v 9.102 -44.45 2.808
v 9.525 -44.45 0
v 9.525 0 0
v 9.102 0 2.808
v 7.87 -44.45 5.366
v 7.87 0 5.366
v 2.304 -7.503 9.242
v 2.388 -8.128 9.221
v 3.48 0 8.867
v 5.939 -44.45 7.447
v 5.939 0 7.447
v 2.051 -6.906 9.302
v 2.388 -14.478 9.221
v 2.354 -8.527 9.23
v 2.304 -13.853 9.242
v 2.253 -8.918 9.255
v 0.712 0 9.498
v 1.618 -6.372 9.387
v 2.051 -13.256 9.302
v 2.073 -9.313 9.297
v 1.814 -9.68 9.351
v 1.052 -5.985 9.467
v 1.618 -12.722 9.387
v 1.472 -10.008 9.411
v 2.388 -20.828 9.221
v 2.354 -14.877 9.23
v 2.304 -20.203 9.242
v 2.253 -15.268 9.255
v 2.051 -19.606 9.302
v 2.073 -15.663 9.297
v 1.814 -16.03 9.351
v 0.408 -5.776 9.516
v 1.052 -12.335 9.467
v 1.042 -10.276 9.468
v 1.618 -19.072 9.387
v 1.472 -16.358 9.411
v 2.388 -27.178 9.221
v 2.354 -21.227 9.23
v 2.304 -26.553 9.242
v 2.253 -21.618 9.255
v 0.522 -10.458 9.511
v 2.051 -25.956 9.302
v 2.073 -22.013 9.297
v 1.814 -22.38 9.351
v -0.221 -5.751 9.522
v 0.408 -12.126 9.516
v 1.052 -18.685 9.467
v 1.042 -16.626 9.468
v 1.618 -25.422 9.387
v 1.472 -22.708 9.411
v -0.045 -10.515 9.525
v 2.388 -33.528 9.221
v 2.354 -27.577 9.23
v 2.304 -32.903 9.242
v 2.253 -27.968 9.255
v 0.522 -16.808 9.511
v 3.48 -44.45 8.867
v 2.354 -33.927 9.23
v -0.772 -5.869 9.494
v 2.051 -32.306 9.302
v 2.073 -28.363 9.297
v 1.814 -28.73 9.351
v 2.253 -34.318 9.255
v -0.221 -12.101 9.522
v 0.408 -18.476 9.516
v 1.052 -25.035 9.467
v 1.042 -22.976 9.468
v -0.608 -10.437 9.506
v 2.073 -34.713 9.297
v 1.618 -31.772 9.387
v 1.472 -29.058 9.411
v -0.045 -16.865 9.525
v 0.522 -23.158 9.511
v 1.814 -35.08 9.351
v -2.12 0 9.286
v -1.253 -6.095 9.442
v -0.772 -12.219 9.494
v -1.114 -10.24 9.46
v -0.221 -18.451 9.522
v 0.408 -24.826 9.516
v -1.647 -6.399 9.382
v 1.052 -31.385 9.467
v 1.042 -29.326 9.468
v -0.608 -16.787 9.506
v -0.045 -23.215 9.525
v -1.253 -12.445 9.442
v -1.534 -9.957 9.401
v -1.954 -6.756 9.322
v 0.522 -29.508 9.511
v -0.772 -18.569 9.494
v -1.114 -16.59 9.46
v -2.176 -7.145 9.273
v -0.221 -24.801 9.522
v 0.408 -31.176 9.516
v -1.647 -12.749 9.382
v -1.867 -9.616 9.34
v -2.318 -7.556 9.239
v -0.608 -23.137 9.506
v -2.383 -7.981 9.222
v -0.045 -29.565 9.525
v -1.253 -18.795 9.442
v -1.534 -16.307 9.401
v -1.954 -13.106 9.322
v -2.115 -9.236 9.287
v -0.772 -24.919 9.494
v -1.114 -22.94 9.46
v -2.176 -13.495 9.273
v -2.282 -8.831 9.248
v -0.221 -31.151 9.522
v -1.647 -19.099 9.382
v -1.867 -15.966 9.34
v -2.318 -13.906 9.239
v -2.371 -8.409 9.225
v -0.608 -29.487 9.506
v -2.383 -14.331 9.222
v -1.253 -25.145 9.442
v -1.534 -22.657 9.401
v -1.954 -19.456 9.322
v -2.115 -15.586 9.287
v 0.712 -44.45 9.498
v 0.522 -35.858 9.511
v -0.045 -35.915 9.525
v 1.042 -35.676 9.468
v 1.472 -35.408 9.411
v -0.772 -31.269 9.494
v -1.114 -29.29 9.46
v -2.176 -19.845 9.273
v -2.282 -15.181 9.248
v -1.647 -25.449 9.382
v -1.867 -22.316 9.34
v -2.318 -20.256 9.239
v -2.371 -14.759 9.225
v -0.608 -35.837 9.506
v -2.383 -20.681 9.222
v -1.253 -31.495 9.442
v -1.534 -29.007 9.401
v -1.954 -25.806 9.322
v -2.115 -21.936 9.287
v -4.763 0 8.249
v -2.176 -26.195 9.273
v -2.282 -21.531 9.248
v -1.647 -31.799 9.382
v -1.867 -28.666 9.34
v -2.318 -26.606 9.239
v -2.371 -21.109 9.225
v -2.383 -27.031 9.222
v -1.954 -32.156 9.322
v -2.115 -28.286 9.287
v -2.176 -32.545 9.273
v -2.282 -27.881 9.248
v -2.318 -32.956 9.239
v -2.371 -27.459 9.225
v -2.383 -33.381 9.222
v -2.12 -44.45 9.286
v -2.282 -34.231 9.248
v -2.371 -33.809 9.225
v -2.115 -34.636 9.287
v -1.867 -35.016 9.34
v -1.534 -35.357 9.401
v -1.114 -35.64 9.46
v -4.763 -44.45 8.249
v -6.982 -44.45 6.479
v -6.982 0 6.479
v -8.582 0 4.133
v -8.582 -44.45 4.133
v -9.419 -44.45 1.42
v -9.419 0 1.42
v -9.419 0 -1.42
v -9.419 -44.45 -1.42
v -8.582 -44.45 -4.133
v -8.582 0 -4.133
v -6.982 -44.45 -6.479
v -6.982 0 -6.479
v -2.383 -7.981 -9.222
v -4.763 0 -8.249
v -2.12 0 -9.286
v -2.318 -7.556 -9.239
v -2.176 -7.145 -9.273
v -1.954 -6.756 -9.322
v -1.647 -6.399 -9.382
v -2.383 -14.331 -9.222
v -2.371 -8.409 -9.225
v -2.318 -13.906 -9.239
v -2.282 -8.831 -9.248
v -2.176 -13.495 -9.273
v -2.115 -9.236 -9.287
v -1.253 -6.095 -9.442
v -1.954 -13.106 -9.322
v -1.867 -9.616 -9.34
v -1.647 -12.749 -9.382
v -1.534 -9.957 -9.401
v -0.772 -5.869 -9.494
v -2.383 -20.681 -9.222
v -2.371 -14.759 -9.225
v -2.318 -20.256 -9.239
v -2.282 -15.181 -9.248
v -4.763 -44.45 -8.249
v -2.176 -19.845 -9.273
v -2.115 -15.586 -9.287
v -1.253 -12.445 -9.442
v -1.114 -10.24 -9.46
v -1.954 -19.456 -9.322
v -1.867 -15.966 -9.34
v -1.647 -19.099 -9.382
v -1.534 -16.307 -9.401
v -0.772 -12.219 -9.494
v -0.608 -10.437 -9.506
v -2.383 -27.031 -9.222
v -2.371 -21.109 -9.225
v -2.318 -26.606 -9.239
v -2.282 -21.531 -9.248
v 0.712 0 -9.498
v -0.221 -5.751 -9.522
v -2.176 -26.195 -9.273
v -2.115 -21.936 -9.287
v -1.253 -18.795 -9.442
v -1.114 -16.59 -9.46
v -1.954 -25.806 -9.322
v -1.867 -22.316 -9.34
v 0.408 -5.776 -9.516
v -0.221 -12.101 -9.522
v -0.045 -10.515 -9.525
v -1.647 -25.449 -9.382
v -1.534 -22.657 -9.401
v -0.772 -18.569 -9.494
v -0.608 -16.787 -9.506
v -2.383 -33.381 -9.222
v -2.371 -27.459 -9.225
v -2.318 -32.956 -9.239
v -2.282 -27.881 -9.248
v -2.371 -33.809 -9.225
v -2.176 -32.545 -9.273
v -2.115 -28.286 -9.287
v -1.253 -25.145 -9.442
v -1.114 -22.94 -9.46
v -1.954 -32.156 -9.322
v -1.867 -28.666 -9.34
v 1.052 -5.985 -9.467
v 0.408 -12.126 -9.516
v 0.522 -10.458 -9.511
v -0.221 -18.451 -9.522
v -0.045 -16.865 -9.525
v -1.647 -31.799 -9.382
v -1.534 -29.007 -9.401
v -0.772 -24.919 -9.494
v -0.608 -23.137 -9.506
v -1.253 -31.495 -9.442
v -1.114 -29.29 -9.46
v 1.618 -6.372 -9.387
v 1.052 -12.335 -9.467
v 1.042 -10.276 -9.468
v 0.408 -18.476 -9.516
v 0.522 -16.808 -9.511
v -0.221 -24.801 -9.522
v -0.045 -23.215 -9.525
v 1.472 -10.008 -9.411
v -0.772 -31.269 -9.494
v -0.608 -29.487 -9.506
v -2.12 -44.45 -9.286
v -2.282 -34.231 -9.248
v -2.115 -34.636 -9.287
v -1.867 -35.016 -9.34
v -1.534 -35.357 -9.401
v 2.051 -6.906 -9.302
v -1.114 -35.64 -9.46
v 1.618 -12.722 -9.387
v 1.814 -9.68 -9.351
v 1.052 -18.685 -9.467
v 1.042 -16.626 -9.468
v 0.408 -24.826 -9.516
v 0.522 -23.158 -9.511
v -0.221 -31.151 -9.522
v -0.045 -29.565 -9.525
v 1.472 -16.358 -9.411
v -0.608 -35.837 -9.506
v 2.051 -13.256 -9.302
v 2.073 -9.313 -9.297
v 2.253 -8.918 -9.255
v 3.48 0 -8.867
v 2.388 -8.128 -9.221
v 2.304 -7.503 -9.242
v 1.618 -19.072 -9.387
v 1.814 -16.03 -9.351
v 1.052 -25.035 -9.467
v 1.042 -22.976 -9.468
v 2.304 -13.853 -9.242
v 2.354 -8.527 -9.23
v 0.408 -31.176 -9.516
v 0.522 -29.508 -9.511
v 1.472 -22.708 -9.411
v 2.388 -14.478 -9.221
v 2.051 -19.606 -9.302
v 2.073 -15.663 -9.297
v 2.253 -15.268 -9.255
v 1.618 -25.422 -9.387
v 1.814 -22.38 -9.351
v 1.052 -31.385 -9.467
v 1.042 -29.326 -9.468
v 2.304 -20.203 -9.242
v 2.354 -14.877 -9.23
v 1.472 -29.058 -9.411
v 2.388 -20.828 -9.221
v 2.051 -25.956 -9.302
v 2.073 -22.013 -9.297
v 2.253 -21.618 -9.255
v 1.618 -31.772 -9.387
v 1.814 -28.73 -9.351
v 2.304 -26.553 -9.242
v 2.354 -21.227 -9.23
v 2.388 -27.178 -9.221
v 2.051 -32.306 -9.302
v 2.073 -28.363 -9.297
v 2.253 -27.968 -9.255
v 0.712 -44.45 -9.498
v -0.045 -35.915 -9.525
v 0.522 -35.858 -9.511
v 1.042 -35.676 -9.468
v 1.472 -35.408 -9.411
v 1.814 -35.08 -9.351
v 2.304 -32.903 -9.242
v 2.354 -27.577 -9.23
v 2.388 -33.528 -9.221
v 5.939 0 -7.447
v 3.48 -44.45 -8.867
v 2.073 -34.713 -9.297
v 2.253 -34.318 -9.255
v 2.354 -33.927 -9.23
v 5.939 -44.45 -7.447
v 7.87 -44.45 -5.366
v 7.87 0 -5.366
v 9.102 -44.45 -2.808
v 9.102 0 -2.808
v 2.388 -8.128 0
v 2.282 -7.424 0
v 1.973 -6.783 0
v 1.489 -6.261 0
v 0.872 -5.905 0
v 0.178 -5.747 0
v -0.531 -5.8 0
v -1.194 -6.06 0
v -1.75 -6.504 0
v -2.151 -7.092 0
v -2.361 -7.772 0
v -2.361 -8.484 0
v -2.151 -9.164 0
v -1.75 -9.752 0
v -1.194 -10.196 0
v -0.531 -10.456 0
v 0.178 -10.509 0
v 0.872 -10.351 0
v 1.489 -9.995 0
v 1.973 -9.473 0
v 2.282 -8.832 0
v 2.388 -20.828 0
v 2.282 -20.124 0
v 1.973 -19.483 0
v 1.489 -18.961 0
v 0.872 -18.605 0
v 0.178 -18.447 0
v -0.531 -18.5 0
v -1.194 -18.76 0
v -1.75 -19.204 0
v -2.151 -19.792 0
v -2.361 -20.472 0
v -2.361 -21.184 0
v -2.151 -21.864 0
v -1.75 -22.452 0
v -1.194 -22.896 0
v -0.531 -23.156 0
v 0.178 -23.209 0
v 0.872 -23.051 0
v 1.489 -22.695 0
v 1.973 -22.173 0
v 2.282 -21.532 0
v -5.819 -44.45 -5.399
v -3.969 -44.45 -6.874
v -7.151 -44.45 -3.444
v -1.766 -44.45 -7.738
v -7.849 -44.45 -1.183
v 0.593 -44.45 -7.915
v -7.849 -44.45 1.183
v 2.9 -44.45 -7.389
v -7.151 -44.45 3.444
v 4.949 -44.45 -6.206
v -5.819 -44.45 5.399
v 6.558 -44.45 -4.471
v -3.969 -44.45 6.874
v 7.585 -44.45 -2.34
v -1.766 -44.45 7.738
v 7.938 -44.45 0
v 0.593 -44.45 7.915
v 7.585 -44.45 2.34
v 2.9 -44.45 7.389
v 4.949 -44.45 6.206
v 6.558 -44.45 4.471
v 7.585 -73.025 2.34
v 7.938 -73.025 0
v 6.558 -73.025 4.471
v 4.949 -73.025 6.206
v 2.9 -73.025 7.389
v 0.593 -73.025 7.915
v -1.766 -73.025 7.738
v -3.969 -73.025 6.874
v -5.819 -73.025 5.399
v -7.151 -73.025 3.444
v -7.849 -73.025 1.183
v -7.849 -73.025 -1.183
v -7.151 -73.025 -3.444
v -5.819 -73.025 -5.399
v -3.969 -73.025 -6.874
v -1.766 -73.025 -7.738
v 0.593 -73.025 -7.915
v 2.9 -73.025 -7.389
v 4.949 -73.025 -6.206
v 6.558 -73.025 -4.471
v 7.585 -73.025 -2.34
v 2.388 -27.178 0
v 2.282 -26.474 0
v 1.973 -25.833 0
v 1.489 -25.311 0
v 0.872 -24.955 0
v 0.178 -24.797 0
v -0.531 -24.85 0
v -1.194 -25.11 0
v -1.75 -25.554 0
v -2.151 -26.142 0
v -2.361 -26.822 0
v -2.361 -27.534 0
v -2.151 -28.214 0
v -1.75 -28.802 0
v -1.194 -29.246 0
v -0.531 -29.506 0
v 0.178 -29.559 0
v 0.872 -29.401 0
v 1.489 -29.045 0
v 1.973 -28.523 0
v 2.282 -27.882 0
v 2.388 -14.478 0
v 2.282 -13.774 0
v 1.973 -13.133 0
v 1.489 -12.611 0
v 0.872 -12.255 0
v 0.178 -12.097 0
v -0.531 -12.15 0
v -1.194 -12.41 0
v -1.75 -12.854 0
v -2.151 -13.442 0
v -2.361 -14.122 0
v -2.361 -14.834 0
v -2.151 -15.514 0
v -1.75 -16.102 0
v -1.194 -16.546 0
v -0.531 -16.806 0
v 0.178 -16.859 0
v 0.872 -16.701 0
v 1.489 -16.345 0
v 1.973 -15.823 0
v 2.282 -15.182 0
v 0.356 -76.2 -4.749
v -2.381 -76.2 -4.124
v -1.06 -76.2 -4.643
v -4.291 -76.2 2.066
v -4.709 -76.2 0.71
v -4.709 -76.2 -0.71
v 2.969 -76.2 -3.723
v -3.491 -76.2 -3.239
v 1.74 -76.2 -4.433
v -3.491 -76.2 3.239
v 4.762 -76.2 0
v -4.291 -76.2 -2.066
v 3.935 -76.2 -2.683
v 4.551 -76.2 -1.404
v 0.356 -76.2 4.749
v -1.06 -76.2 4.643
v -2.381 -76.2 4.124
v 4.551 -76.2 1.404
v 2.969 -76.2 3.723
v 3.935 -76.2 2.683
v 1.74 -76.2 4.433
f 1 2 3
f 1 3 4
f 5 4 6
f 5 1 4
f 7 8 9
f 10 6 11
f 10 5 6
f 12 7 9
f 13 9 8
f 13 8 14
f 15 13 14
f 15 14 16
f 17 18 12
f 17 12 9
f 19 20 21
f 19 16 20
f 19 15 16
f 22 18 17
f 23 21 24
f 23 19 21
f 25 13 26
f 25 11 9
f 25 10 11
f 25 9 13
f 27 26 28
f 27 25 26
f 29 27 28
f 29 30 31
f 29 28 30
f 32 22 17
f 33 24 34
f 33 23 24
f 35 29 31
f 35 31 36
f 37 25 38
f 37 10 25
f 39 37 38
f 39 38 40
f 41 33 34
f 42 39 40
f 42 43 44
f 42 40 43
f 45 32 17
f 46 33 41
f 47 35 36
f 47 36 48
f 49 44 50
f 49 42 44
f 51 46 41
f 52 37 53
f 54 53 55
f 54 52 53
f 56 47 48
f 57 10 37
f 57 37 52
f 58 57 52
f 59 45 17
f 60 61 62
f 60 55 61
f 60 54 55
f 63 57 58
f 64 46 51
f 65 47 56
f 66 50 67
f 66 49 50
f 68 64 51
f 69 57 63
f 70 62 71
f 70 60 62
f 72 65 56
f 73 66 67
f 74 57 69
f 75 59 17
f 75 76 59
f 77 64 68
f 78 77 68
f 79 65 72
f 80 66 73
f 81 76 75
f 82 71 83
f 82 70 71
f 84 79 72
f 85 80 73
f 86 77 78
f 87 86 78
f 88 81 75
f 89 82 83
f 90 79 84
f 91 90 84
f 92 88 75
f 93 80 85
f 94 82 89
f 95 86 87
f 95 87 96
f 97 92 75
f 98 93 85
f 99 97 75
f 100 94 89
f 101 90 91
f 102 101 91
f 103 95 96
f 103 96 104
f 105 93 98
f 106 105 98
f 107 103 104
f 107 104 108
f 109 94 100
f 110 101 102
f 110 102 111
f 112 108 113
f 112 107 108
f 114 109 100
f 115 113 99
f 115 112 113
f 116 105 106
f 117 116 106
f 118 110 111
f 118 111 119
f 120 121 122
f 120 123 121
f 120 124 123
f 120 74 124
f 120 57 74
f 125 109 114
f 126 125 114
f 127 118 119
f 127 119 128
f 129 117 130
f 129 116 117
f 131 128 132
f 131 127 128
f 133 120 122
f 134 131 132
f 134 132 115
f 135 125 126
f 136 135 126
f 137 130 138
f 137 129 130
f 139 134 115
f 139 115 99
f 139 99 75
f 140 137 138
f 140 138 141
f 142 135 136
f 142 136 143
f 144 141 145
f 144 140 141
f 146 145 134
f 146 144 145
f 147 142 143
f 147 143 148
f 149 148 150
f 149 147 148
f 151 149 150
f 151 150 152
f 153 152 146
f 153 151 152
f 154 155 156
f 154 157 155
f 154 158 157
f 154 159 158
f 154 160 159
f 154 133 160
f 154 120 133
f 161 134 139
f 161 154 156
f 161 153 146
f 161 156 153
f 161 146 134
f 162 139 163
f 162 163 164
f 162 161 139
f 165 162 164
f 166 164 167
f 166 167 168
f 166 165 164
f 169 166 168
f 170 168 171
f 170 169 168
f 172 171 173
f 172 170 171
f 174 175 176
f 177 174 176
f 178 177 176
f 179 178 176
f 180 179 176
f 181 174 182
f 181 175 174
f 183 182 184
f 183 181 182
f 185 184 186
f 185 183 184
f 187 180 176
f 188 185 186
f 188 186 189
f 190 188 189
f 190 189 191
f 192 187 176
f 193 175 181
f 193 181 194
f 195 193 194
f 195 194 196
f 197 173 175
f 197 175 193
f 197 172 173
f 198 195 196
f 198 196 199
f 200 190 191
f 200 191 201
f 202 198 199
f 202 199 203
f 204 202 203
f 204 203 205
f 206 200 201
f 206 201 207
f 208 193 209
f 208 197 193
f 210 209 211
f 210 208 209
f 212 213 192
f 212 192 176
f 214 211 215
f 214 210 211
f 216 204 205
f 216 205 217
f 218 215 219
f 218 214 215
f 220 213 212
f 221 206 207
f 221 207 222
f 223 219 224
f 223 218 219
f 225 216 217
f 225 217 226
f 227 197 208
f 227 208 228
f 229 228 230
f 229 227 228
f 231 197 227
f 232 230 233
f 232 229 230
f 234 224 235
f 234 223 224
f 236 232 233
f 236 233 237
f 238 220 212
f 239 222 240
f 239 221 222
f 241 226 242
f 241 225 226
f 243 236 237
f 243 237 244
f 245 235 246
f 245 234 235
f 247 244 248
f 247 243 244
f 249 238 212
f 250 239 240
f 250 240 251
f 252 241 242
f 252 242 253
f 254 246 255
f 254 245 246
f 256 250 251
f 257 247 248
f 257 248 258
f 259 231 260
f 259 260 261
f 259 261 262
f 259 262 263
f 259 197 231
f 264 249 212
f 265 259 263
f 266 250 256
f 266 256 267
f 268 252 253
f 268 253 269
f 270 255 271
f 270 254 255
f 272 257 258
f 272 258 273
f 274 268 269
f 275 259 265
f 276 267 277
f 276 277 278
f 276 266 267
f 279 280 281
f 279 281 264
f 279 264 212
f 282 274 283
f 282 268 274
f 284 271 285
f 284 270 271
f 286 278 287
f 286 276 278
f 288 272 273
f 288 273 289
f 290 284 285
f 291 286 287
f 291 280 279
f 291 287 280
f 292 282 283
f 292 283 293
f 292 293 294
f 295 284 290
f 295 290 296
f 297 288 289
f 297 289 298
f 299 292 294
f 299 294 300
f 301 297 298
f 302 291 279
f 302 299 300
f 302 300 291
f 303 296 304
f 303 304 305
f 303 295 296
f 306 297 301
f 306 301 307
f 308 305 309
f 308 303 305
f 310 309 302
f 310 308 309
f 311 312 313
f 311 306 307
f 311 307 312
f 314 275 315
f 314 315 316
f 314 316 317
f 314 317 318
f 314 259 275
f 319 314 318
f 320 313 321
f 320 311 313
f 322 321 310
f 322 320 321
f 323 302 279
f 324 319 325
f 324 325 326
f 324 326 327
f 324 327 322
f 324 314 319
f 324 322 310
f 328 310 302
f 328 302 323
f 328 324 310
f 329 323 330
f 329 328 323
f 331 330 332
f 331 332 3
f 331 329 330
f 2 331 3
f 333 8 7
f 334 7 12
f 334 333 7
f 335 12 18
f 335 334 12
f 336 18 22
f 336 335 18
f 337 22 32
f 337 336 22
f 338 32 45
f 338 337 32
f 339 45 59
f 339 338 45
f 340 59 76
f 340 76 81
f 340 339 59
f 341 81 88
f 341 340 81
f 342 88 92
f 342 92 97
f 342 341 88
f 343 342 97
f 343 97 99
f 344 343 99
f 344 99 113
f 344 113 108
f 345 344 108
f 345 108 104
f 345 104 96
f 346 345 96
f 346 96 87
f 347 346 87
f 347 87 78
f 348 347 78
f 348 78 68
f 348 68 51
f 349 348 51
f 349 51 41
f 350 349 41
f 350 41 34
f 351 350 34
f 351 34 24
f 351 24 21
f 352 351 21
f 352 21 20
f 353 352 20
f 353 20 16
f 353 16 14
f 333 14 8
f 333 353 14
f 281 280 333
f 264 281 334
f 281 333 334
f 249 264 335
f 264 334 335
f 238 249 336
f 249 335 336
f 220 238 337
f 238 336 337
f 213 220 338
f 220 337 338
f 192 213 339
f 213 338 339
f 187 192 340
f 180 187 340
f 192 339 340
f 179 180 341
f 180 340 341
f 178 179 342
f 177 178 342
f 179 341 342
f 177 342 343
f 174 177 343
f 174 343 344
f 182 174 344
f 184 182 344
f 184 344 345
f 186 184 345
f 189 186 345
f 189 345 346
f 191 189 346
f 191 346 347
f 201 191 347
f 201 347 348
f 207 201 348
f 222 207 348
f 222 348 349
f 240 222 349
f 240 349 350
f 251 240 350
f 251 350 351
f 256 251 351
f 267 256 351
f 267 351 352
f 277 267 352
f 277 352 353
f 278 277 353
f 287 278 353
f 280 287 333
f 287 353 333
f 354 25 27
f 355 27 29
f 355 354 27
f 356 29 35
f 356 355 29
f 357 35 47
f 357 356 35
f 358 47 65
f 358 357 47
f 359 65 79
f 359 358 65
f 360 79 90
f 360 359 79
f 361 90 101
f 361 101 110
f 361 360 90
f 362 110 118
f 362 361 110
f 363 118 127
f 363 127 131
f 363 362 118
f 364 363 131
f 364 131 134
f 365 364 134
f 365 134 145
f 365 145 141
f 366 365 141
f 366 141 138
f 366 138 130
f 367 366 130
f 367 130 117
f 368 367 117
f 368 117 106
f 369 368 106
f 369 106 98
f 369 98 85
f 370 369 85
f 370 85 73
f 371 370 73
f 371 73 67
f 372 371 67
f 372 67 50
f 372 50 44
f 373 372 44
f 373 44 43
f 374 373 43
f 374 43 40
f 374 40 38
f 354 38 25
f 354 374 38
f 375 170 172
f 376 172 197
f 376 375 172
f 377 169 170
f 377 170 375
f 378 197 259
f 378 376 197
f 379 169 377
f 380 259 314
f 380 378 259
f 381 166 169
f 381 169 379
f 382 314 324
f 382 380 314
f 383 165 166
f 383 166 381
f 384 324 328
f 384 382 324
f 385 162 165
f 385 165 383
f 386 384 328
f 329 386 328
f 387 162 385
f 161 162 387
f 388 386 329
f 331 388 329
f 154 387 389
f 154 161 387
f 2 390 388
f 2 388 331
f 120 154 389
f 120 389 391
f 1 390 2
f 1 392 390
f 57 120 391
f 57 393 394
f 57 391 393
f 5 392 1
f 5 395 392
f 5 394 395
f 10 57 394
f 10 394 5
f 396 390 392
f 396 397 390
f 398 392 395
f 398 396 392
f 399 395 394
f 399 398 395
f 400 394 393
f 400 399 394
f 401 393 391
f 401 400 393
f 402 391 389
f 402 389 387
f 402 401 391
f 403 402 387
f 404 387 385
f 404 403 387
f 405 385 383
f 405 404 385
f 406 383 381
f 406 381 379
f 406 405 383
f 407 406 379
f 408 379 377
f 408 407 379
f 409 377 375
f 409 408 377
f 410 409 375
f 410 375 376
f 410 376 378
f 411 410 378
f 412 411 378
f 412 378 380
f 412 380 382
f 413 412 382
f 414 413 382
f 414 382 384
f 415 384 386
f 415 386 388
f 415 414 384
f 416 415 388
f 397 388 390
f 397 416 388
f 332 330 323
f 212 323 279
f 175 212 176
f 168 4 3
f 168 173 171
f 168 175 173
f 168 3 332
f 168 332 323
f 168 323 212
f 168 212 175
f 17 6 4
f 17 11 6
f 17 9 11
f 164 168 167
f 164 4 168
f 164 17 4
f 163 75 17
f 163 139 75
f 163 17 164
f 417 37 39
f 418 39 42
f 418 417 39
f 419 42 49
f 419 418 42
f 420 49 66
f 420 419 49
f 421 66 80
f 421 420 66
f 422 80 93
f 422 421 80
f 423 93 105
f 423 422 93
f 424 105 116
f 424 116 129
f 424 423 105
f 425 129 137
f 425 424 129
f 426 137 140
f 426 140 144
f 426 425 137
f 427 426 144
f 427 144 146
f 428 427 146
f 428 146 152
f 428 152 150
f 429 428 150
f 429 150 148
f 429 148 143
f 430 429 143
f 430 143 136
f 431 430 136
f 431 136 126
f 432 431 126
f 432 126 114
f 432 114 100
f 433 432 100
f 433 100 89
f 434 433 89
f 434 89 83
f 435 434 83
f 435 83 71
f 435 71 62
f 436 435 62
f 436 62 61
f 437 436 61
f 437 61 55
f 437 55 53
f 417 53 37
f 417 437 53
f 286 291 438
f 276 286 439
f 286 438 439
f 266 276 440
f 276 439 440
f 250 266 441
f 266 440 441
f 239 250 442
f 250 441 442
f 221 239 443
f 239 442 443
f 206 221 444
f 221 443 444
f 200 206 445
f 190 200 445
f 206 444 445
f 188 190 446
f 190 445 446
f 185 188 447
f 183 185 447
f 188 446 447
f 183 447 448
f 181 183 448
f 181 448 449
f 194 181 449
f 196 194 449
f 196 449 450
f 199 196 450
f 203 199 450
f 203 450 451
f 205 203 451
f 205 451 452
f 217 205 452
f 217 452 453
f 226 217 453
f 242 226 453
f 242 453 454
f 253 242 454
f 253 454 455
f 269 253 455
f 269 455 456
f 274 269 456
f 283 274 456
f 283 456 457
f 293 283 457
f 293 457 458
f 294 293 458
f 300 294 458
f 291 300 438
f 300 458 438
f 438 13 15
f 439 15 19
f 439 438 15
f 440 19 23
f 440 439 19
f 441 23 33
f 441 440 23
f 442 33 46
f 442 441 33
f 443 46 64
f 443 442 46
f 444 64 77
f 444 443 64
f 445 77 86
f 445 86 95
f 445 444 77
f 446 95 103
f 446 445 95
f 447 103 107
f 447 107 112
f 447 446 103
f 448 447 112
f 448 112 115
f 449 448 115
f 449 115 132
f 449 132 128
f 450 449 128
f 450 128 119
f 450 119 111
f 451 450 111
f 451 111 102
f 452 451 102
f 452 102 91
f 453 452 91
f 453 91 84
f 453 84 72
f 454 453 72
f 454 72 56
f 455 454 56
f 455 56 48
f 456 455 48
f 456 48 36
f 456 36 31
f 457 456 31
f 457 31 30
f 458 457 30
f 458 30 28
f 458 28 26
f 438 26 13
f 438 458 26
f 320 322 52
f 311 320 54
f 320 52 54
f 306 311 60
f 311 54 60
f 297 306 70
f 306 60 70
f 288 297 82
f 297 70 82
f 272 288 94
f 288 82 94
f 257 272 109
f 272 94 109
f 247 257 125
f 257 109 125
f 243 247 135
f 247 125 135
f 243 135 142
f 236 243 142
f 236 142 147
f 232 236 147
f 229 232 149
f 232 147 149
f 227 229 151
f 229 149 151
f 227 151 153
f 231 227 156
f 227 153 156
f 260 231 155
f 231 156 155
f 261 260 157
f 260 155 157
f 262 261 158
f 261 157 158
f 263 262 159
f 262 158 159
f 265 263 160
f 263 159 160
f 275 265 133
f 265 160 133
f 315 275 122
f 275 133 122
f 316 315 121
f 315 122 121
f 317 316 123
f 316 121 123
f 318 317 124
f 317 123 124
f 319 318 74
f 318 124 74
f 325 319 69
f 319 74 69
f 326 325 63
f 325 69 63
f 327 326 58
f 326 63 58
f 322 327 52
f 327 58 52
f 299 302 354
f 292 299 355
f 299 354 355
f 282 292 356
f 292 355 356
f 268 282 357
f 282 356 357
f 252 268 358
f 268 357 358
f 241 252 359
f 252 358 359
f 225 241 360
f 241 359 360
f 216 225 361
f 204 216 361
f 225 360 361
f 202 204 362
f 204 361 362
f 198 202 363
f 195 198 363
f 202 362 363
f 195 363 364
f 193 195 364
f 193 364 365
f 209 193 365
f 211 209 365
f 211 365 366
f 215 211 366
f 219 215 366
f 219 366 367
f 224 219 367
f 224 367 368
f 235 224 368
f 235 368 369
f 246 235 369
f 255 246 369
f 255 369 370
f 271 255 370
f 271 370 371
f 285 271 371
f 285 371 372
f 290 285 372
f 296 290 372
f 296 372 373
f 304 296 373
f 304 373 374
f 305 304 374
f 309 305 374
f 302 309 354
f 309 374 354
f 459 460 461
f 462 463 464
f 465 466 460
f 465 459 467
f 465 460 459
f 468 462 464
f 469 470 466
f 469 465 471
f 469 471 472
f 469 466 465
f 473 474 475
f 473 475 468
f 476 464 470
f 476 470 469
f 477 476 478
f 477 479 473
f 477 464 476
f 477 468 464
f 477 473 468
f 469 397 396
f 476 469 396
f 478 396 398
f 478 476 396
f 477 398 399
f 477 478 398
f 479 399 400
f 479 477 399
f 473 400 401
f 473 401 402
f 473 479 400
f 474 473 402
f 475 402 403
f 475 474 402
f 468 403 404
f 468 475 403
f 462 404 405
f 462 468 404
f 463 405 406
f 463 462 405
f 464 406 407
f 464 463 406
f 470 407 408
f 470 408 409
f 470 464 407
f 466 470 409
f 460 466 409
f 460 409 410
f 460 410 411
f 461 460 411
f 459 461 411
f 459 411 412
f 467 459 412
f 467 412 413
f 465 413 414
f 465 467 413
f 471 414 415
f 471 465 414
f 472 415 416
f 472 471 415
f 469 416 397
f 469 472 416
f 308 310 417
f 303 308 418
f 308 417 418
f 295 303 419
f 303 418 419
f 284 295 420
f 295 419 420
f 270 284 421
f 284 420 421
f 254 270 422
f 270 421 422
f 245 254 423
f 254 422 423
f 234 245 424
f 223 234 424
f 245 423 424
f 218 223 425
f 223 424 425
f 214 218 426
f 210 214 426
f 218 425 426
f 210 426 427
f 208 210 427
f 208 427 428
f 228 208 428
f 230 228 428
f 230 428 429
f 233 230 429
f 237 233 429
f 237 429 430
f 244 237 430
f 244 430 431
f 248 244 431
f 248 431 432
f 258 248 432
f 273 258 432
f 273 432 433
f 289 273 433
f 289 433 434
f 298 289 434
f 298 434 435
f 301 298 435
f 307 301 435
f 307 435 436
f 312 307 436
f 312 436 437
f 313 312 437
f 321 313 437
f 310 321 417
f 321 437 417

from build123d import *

# Parameters (mm, degrees)
SKETCH2_R          = 2.3876
CUT_EXTRUDE1_DEPTH = 18.161


with BuildPart() as part:
    # Sketch1 → Revolve1 (revolve)
    with BuildSketch(Plane.XY):
        Polygon((0, 0), (9.525, 0), (9.525, -44.45), (7.9375, -44.45), (7.9375, -73.025), (4.7625, -76.2), (0, -76.2), align=None)
    revolve(axis=Axis((0, 76.054523893, 0), (0, -1, 0)))

    # Sketch2 → Cut-Extrude1 (cut, symmetric)
    with BuildSketch(Plane.XY):
        with Locations((0, -8.128)):
            Circle(SKETCH2_R)
        with Locations((0, -14.478)):
            Circle(SKETCH2_R)
        with Locations((0, -20.828)):
            Circle(SKETCH2_R)
        with Locations((0, -27.178)):
            Circle(SKETCH2_R)
        with Locations((0, -33.528)):
            Circle(SKETCH2_R)
    extrude(amount=CUT_EXTRUDE1_DEPTH, both=True, mode=Mode.SUBTRACT)


solid = part.part
